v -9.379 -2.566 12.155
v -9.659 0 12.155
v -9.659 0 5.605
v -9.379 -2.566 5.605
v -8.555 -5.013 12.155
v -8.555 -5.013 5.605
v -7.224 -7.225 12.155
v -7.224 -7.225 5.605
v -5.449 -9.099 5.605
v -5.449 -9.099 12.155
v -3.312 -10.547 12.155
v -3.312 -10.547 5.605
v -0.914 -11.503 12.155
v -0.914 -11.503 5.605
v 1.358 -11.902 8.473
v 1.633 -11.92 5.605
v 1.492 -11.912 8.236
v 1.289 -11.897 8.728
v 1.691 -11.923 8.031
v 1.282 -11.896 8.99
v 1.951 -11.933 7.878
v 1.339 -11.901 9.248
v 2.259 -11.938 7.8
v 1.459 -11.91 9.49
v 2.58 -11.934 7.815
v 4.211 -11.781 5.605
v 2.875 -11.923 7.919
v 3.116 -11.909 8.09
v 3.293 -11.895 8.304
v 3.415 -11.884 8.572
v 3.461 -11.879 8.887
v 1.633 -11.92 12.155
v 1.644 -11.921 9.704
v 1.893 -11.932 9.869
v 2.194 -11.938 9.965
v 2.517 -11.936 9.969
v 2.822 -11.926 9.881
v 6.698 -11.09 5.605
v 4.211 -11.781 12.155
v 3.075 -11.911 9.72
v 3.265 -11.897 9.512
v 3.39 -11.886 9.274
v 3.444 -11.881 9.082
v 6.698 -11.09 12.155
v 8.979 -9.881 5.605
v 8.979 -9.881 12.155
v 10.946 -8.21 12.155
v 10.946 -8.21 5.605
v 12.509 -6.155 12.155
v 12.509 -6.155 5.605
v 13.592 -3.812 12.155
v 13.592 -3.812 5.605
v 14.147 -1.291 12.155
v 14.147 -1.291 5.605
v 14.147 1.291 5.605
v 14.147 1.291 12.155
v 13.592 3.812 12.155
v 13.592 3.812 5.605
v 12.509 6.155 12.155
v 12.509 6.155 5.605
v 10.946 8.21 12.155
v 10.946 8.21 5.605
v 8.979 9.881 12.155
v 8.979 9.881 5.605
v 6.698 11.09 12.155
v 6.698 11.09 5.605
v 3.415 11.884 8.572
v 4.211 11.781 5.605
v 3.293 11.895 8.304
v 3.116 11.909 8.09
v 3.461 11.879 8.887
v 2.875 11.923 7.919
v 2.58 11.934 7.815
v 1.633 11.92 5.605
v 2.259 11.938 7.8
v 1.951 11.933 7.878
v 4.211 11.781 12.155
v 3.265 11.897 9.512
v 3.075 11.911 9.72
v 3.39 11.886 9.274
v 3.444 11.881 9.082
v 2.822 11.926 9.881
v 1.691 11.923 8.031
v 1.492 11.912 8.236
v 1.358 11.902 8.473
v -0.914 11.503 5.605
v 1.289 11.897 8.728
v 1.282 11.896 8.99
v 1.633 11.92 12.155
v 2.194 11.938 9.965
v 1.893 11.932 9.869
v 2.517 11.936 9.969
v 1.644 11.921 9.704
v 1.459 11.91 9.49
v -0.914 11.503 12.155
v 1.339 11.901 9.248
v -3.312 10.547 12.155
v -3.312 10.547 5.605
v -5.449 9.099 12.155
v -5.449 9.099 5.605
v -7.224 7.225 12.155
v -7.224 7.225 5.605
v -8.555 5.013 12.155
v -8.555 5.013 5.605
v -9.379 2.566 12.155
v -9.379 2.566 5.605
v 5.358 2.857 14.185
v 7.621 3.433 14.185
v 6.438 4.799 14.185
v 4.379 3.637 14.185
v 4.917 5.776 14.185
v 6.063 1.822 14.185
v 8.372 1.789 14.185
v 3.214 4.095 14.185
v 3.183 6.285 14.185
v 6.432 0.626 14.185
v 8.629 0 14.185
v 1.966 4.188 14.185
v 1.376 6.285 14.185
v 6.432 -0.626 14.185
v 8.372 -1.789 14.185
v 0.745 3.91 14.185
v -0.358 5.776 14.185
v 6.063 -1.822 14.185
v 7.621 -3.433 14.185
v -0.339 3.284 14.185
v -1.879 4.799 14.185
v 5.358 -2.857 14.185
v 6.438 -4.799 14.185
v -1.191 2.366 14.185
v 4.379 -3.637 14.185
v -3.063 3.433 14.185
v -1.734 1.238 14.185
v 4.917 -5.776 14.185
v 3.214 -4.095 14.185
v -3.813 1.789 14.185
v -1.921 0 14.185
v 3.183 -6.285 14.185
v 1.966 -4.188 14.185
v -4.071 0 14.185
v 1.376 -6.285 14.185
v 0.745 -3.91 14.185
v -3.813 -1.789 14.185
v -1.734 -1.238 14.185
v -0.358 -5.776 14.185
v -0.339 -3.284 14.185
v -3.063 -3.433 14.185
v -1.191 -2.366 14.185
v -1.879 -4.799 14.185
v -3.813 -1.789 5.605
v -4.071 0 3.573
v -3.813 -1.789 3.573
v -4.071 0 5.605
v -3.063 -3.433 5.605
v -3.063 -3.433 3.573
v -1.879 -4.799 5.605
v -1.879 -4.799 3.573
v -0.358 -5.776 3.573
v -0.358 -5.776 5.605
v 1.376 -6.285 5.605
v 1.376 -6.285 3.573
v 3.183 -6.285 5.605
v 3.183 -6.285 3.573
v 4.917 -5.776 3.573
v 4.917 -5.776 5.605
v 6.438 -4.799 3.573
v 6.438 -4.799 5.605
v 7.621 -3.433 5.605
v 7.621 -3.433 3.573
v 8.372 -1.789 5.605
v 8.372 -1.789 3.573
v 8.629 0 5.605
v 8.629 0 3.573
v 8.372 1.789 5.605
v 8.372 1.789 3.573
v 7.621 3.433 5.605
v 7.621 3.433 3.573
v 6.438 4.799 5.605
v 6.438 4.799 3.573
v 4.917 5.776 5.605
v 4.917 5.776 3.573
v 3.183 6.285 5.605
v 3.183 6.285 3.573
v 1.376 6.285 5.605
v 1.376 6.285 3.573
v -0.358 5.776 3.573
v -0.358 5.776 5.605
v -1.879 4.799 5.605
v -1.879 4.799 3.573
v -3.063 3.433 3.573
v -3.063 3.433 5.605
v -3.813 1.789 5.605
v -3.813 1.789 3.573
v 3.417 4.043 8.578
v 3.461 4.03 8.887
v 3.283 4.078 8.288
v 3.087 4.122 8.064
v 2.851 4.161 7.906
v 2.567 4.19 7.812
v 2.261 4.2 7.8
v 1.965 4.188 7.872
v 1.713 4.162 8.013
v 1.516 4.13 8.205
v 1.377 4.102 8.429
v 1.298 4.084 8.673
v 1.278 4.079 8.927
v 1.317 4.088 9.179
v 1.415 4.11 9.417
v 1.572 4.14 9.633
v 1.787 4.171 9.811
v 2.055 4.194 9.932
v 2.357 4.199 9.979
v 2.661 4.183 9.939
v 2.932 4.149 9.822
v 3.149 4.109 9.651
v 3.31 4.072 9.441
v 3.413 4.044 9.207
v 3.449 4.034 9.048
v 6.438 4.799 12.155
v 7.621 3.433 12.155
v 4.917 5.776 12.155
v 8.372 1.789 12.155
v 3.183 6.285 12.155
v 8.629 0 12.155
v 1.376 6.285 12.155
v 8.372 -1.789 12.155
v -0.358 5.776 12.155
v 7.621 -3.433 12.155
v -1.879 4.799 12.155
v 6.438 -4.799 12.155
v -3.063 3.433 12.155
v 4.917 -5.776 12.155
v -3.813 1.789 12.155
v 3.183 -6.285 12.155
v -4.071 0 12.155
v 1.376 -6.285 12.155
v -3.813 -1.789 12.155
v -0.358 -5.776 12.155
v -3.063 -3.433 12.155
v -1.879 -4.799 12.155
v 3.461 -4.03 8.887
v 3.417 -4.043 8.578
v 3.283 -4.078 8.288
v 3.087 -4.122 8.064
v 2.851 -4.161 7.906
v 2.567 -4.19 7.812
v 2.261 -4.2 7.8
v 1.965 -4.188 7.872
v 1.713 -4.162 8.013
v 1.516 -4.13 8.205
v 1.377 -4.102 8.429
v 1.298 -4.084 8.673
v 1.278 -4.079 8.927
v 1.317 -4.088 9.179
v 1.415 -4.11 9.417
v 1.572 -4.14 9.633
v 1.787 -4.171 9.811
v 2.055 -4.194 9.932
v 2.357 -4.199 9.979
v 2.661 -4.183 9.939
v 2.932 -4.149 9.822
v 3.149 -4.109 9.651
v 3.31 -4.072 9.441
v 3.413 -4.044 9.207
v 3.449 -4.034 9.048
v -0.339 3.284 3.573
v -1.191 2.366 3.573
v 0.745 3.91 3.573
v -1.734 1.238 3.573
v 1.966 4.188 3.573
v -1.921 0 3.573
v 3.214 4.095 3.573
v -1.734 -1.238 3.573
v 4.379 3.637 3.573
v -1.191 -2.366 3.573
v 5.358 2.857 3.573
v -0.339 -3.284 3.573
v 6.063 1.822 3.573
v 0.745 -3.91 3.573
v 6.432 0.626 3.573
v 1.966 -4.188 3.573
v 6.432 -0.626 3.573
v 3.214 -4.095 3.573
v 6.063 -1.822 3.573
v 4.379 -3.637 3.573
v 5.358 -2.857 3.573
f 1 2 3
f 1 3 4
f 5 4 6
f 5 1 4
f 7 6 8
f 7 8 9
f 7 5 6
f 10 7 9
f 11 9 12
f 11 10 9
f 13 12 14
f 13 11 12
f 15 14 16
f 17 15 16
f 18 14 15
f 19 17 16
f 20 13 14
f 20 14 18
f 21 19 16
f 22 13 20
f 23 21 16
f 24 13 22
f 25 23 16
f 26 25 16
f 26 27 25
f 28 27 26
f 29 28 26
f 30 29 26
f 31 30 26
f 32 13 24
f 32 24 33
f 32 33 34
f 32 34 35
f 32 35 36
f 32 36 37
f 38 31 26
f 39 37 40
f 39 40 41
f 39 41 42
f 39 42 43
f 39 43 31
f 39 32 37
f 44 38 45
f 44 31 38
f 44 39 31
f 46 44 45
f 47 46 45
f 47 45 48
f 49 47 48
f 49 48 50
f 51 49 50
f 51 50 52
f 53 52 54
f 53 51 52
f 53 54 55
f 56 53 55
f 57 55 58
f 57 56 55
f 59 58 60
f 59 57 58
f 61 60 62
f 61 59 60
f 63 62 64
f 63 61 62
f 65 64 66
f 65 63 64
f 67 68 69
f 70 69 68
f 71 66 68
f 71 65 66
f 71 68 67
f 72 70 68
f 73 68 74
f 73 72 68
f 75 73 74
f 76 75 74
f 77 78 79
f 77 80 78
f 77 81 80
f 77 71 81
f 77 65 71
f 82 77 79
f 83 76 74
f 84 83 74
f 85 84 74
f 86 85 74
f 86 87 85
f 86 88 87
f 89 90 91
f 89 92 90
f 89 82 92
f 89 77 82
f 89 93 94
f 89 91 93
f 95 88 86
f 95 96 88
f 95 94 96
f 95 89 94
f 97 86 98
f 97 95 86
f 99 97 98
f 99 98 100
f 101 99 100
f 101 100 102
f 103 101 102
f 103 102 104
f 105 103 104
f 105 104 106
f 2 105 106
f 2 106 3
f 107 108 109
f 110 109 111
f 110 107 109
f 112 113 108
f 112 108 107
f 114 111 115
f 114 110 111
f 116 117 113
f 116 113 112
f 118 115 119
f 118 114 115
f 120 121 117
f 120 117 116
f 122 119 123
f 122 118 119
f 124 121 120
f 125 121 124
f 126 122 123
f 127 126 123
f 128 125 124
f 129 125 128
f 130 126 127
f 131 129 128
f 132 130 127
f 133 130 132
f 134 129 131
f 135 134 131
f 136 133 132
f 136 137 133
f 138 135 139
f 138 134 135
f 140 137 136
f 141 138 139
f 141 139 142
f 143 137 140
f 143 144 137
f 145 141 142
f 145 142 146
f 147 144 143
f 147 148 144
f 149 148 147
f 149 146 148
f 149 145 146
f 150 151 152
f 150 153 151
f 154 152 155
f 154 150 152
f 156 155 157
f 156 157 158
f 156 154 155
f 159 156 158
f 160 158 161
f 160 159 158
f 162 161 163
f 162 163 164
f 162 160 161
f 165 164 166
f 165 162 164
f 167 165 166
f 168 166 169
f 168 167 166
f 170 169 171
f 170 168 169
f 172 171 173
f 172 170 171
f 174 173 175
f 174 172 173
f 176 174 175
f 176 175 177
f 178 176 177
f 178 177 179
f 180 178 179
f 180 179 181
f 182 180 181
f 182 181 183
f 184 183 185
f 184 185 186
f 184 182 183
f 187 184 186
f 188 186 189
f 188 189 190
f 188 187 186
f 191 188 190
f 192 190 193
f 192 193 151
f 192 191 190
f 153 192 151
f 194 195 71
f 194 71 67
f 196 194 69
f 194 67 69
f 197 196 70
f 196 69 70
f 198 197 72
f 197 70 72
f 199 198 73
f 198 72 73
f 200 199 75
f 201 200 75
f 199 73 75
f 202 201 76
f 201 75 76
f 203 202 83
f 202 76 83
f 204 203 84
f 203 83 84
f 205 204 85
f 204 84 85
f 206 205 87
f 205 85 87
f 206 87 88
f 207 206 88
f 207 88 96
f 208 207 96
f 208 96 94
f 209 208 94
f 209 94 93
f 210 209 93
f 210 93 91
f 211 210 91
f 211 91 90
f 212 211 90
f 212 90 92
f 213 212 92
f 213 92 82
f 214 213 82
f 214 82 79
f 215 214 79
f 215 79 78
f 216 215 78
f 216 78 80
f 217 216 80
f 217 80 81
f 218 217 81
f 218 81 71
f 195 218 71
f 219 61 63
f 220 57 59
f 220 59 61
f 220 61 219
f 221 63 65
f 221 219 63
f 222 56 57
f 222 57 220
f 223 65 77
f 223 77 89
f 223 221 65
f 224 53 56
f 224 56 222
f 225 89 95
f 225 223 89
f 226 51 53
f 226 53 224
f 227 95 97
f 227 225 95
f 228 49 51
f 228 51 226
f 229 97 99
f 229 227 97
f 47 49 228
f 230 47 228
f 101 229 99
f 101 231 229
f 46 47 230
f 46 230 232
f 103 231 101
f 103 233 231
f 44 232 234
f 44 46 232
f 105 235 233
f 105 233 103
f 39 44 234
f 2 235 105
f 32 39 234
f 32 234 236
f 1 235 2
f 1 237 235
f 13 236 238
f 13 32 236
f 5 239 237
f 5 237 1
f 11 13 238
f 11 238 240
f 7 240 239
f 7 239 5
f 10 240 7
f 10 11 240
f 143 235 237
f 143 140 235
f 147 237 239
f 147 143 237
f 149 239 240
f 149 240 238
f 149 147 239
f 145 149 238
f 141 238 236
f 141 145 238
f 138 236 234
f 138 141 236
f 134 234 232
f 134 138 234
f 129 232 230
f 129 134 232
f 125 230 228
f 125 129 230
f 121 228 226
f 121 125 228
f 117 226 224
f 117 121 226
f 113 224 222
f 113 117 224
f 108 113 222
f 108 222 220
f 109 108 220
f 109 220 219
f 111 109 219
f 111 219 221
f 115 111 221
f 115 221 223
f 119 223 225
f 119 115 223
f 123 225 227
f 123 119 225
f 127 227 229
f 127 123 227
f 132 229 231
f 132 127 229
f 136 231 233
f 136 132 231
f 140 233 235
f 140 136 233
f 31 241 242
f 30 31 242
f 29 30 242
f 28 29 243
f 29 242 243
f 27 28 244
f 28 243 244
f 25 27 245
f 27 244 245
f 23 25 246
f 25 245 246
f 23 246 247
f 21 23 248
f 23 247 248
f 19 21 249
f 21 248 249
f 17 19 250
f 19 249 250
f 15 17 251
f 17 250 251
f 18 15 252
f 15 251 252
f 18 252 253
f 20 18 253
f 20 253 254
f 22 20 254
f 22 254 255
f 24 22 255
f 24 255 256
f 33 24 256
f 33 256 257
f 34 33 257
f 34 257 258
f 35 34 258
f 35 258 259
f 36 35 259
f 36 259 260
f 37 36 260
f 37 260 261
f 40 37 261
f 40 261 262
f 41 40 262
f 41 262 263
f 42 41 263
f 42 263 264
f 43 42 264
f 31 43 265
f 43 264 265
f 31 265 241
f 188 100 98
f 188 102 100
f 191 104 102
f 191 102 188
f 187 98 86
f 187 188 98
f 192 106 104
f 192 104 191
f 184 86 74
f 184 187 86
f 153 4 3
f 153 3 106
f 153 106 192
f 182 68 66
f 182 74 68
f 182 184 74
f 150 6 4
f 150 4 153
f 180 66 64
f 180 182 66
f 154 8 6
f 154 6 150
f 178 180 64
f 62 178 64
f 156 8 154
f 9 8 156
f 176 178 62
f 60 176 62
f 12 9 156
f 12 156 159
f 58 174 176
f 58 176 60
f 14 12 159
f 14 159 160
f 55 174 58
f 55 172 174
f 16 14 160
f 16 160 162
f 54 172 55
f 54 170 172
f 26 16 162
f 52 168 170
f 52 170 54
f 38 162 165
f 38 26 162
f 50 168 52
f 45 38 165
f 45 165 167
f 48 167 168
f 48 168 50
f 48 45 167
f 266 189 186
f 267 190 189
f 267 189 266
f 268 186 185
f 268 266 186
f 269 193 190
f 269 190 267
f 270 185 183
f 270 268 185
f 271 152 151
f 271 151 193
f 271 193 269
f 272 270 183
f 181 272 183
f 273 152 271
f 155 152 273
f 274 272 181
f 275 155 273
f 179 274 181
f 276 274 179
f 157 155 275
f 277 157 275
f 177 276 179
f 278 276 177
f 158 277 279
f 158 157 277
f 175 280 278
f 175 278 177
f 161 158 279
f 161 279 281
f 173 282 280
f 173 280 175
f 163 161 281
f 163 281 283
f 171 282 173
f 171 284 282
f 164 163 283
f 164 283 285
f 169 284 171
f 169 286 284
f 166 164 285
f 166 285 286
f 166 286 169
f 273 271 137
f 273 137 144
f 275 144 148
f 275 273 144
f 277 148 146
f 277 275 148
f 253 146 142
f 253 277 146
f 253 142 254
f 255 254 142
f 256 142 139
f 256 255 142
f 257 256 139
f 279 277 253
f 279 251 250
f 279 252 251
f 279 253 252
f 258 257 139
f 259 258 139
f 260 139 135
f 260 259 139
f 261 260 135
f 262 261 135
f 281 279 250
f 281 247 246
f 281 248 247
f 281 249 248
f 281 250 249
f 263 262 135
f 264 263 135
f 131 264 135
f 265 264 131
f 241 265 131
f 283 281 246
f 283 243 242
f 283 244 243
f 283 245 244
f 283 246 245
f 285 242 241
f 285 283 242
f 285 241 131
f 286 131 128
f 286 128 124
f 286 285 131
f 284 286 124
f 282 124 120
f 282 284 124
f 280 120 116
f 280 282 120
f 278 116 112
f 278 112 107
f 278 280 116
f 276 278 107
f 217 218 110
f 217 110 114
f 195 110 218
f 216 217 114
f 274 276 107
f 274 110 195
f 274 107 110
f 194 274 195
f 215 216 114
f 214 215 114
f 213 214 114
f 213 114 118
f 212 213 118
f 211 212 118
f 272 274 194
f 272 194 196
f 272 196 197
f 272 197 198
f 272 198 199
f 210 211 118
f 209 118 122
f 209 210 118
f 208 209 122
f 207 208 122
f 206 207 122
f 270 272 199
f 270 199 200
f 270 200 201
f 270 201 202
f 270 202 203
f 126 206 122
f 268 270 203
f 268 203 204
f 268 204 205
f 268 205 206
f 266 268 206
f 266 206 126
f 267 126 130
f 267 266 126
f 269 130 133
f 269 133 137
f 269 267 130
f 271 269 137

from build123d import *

# Parameters (mm, degrees)
SKETCH1_W          = 2.15
SKETCH1_H          = 2.03
SKETCH2_R          = 1.0922
CUT_EXTRUDE1_DEPTH = 24.876


with BuildPart() as part:
    # Sketch1 → Revolve1 (revolve)
    with BuildSketch(Plane(origin=(0, 0, 0), x_dir=(1, 0, 0), z_dir=(0, 1, 0))):
        with Locations((-2.995601826, -13.170436757)):
            Rectangle(SKETCH1_W, SKETCH1_H)
        Polygon((-4.070601826, -12.155436757), (-1.920601826, -12.155436757), (-1.920601826, -3.573436757), (-4.070601826, -3.573436757), (-4.070601826, -5.605436757), align=None)
        Polygon((-5.107903637, -12.155436757), (-4.070601826, -12.155436757), (-4.070601826, -5.605436757), (-9.658601826, -5.605436757), (-9.658601826, -12.155436757), align=None)
    revolve(axis=Axis((2.279398174, 0, -19.129935757), (0, 0, 1)))

    # Sketch2 → Cut-Extrude1 (cut, through all)
    with BuildSketch(Plane(origin=(0, 11.938, 0), x_dir=(1, 0, 0), z_dir=(0, 1, 0))):
        with Locations((2.369164509, -8.88650333)):
            Circle(SKETCH2_R)
    extrude(amount=-CUT_EXTRUDE1_DEPTH, mode=Mode.SUBTRACT)


solid = part.part
